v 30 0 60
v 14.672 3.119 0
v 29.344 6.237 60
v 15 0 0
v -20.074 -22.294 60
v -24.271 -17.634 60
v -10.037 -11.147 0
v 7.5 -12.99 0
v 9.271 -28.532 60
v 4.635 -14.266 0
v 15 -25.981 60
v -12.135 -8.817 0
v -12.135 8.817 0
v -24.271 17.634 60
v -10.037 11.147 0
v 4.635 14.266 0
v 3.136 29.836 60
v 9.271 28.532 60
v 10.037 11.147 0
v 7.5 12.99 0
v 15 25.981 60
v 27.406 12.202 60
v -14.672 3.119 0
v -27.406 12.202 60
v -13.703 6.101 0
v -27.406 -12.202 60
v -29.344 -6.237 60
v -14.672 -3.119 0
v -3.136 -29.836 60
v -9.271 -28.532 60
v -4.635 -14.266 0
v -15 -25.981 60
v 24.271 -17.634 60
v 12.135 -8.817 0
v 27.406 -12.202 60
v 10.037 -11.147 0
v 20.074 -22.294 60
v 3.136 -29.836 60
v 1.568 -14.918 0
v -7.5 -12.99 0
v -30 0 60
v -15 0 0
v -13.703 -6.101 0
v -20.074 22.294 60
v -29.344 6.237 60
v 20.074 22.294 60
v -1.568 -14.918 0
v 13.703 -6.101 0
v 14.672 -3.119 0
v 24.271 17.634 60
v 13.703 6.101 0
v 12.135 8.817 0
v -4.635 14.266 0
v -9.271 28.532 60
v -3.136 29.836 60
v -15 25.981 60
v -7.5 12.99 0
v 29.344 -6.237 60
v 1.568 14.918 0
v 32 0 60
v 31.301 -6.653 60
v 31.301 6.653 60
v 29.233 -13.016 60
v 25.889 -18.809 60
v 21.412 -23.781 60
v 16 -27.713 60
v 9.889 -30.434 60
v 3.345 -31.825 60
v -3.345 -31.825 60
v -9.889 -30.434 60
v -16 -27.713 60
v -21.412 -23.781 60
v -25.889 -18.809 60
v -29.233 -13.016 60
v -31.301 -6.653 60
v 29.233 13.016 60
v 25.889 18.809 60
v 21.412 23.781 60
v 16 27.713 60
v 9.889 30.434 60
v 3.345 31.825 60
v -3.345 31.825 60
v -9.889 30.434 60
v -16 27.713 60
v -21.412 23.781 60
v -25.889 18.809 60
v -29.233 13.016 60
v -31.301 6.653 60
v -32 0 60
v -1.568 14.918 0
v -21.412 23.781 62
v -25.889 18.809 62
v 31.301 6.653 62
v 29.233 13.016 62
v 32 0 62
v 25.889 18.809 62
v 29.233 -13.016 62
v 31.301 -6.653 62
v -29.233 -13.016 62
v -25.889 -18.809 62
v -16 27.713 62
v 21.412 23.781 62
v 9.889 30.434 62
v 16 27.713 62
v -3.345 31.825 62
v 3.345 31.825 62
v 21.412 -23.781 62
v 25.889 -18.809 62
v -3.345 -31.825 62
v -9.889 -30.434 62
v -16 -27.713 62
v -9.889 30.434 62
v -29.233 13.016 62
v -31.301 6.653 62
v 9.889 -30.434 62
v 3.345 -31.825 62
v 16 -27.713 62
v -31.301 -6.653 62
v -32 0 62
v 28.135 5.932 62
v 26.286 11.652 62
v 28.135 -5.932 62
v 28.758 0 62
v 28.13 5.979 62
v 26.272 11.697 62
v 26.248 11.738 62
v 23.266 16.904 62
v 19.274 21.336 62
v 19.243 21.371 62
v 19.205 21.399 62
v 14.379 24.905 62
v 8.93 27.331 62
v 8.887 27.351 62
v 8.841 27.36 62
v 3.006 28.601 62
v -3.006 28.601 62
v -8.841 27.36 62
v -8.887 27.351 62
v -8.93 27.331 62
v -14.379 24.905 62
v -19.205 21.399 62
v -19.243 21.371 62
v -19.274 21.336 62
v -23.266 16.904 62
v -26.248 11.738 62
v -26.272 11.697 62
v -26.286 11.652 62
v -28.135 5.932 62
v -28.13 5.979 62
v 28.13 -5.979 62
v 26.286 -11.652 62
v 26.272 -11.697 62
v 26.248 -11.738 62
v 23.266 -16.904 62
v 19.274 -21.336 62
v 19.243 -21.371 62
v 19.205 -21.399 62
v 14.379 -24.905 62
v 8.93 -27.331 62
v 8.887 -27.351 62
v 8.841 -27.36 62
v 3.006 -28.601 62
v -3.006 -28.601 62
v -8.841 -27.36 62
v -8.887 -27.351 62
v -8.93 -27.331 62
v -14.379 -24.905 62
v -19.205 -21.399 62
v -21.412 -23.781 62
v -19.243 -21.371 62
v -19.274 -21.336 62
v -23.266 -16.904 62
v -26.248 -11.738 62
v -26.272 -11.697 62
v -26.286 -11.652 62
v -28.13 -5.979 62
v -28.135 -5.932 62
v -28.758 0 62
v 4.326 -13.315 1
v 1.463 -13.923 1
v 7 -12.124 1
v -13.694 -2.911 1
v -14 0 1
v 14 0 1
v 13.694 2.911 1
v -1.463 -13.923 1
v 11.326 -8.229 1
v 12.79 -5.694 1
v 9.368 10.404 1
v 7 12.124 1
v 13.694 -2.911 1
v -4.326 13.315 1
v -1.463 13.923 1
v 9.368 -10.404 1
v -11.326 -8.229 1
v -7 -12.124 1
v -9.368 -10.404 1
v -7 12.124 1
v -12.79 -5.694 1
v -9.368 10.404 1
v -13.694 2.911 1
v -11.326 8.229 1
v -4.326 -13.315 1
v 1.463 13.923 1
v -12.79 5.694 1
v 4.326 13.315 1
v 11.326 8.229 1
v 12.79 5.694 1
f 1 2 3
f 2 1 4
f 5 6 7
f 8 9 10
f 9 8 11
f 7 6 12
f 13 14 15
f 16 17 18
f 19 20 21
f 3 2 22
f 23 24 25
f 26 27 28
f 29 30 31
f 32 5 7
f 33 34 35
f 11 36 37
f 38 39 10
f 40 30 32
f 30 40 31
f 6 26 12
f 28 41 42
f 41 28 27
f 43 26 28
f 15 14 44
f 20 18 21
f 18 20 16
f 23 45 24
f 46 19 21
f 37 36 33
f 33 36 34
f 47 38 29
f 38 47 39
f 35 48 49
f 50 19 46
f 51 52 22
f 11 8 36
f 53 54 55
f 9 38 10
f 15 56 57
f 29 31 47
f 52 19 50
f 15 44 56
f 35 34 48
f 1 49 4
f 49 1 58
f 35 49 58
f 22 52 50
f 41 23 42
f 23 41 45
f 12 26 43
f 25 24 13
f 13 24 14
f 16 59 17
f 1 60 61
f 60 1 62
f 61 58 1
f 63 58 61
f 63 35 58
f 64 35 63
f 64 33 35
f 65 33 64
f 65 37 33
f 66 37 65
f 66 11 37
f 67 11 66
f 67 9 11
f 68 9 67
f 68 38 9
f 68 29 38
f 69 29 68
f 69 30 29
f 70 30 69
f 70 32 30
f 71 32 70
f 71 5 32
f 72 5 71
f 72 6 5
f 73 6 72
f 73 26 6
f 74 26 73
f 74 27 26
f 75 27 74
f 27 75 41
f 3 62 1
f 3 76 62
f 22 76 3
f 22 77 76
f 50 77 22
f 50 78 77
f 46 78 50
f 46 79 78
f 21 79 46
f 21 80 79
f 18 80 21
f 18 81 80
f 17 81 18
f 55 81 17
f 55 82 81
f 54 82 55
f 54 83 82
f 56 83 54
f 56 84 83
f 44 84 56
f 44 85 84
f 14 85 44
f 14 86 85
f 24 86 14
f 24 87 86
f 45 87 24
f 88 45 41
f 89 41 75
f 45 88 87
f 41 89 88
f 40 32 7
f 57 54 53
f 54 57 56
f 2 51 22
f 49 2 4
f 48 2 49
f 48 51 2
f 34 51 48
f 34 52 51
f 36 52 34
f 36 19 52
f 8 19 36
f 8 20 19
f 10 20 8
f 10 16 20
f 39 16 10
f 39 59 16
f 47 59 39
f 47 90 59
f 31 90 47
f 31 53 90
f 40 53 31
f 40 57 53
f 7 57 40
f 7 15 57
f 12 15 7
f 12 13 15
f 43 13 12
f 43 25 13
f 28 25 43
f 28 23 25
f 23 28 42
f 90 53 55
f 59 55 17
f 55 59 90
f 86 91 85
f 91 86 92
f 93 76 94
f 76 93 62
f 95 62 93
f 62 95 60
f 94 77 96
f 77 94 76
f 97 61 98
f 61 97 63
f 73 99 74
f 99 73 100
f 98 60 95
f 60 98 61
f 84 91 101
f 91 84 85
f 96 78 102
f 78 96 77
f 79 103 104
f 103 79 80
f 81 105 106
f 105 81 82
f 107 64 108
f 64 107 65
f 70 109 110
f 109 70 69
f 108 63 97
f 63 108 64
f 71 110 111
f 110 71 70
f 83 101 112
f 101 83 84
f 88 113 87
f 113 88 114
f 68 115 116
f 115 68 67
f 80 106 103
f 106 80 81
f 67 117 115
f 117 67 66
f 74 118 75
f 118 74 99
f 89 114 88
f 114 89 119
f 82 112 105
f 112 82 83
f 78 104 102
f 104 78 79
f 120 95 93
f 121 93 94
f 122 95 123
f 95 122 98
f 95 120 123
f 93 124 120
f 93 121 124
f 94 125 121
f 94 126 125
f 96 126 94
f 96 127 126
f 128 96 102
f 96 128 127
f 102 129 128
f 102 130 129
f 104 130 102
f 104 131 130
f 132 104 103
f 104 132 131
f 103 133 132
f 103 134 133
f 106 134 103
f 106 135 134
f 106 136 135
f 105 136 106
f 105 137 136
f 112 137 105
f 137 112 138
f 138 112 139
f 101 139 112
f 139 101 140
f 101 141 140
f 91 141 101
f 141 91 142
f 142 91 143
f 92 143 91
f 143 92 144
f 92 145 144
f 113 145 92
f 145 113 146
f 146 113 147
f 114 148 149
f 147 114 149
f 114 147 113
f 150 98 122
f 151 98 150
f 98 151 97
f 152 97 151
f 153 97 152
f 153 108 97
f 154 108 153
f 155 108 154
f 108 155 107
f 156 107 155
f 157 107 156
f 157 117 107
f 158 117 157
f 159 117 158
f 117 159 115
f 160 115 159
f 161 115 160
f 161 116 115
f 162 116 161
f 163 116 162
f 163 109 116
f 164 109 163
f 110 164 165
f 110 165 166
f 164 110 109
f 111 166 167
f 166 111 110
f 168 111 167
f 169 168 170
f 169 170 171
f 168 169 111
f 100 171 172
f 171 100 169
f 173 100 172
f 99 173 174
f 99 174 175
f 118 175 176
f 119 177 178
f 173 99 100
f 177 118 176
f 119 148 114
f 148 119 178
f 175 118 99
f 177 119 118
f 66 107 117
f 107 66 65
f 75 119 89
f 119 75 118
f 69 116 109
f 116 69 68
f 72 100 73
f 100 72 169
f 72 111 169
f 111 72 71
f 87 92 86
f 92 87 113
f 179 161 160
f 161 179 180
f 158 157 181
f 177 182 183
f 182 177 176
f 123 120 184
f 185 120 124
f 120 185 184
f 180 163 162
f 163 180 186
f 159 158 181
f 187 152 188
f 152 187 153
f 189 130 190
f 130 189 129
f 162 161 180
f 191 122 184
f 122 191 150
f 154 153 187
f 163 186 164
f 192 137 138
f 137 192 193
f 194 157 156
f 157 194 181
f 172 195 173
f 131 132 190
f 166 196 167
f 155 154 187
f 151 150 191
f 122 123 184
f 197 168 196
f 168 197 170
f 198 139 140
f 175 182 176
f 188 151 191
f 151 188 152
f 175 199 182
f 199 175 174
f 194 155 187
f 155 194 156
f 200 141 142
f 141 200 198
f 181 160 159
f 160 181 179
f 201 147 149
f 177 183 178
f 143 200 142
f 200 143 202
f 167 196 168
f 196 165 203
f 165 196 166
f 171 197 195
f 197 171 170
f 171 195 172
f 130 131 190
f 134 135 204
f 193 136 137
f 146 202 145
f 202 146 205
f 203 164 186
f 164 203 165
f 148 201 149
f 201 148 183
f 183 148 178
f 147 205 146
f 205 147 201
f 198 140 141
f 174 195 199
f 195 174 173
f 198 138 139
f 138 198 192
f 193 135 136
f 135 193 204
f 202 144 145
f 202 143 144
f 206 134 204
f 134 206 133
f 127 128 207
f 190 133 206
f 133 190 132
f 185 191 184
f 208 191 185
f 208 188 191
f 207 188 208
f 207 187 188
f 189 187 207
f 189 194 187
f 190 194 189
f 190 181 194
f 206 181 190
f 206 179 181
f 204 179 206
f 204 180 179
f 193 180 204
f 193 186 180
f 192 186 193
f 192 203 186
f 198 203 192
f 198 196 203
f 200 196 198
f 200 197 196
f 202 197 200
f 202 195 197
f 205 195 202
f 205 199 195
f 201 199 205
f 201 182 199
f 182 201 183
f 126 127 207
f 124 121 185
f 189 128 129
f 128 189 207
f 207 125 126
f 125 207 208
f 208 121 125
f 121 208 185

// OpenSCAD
module pahar_plastic(inaltime_pahar, raza_baza_pahar,     raza_sus_pahar, raza_buza, inaltime_buza,        grosime_perete)

{
    difference(){
    union(){    
          cylinder(h=inaltime_pahar, r1=raza_baza_pahar, r2=raza_sus_pahar);
         translate([0,0,inaltime_pahar]) cylinder(h=inaltime_buza, r=raza_buza);     
           }
        translate([0,0,grosime_perete])cylinder(h=inaltime_pahar+inaltime_buza, r1=raza_baza_pahar-grosime_perete, r2=      raza_sus_pahar-grosime_perete);

} 
}

pahar_plastic(60, 15, 30, 32, 2, 1);
